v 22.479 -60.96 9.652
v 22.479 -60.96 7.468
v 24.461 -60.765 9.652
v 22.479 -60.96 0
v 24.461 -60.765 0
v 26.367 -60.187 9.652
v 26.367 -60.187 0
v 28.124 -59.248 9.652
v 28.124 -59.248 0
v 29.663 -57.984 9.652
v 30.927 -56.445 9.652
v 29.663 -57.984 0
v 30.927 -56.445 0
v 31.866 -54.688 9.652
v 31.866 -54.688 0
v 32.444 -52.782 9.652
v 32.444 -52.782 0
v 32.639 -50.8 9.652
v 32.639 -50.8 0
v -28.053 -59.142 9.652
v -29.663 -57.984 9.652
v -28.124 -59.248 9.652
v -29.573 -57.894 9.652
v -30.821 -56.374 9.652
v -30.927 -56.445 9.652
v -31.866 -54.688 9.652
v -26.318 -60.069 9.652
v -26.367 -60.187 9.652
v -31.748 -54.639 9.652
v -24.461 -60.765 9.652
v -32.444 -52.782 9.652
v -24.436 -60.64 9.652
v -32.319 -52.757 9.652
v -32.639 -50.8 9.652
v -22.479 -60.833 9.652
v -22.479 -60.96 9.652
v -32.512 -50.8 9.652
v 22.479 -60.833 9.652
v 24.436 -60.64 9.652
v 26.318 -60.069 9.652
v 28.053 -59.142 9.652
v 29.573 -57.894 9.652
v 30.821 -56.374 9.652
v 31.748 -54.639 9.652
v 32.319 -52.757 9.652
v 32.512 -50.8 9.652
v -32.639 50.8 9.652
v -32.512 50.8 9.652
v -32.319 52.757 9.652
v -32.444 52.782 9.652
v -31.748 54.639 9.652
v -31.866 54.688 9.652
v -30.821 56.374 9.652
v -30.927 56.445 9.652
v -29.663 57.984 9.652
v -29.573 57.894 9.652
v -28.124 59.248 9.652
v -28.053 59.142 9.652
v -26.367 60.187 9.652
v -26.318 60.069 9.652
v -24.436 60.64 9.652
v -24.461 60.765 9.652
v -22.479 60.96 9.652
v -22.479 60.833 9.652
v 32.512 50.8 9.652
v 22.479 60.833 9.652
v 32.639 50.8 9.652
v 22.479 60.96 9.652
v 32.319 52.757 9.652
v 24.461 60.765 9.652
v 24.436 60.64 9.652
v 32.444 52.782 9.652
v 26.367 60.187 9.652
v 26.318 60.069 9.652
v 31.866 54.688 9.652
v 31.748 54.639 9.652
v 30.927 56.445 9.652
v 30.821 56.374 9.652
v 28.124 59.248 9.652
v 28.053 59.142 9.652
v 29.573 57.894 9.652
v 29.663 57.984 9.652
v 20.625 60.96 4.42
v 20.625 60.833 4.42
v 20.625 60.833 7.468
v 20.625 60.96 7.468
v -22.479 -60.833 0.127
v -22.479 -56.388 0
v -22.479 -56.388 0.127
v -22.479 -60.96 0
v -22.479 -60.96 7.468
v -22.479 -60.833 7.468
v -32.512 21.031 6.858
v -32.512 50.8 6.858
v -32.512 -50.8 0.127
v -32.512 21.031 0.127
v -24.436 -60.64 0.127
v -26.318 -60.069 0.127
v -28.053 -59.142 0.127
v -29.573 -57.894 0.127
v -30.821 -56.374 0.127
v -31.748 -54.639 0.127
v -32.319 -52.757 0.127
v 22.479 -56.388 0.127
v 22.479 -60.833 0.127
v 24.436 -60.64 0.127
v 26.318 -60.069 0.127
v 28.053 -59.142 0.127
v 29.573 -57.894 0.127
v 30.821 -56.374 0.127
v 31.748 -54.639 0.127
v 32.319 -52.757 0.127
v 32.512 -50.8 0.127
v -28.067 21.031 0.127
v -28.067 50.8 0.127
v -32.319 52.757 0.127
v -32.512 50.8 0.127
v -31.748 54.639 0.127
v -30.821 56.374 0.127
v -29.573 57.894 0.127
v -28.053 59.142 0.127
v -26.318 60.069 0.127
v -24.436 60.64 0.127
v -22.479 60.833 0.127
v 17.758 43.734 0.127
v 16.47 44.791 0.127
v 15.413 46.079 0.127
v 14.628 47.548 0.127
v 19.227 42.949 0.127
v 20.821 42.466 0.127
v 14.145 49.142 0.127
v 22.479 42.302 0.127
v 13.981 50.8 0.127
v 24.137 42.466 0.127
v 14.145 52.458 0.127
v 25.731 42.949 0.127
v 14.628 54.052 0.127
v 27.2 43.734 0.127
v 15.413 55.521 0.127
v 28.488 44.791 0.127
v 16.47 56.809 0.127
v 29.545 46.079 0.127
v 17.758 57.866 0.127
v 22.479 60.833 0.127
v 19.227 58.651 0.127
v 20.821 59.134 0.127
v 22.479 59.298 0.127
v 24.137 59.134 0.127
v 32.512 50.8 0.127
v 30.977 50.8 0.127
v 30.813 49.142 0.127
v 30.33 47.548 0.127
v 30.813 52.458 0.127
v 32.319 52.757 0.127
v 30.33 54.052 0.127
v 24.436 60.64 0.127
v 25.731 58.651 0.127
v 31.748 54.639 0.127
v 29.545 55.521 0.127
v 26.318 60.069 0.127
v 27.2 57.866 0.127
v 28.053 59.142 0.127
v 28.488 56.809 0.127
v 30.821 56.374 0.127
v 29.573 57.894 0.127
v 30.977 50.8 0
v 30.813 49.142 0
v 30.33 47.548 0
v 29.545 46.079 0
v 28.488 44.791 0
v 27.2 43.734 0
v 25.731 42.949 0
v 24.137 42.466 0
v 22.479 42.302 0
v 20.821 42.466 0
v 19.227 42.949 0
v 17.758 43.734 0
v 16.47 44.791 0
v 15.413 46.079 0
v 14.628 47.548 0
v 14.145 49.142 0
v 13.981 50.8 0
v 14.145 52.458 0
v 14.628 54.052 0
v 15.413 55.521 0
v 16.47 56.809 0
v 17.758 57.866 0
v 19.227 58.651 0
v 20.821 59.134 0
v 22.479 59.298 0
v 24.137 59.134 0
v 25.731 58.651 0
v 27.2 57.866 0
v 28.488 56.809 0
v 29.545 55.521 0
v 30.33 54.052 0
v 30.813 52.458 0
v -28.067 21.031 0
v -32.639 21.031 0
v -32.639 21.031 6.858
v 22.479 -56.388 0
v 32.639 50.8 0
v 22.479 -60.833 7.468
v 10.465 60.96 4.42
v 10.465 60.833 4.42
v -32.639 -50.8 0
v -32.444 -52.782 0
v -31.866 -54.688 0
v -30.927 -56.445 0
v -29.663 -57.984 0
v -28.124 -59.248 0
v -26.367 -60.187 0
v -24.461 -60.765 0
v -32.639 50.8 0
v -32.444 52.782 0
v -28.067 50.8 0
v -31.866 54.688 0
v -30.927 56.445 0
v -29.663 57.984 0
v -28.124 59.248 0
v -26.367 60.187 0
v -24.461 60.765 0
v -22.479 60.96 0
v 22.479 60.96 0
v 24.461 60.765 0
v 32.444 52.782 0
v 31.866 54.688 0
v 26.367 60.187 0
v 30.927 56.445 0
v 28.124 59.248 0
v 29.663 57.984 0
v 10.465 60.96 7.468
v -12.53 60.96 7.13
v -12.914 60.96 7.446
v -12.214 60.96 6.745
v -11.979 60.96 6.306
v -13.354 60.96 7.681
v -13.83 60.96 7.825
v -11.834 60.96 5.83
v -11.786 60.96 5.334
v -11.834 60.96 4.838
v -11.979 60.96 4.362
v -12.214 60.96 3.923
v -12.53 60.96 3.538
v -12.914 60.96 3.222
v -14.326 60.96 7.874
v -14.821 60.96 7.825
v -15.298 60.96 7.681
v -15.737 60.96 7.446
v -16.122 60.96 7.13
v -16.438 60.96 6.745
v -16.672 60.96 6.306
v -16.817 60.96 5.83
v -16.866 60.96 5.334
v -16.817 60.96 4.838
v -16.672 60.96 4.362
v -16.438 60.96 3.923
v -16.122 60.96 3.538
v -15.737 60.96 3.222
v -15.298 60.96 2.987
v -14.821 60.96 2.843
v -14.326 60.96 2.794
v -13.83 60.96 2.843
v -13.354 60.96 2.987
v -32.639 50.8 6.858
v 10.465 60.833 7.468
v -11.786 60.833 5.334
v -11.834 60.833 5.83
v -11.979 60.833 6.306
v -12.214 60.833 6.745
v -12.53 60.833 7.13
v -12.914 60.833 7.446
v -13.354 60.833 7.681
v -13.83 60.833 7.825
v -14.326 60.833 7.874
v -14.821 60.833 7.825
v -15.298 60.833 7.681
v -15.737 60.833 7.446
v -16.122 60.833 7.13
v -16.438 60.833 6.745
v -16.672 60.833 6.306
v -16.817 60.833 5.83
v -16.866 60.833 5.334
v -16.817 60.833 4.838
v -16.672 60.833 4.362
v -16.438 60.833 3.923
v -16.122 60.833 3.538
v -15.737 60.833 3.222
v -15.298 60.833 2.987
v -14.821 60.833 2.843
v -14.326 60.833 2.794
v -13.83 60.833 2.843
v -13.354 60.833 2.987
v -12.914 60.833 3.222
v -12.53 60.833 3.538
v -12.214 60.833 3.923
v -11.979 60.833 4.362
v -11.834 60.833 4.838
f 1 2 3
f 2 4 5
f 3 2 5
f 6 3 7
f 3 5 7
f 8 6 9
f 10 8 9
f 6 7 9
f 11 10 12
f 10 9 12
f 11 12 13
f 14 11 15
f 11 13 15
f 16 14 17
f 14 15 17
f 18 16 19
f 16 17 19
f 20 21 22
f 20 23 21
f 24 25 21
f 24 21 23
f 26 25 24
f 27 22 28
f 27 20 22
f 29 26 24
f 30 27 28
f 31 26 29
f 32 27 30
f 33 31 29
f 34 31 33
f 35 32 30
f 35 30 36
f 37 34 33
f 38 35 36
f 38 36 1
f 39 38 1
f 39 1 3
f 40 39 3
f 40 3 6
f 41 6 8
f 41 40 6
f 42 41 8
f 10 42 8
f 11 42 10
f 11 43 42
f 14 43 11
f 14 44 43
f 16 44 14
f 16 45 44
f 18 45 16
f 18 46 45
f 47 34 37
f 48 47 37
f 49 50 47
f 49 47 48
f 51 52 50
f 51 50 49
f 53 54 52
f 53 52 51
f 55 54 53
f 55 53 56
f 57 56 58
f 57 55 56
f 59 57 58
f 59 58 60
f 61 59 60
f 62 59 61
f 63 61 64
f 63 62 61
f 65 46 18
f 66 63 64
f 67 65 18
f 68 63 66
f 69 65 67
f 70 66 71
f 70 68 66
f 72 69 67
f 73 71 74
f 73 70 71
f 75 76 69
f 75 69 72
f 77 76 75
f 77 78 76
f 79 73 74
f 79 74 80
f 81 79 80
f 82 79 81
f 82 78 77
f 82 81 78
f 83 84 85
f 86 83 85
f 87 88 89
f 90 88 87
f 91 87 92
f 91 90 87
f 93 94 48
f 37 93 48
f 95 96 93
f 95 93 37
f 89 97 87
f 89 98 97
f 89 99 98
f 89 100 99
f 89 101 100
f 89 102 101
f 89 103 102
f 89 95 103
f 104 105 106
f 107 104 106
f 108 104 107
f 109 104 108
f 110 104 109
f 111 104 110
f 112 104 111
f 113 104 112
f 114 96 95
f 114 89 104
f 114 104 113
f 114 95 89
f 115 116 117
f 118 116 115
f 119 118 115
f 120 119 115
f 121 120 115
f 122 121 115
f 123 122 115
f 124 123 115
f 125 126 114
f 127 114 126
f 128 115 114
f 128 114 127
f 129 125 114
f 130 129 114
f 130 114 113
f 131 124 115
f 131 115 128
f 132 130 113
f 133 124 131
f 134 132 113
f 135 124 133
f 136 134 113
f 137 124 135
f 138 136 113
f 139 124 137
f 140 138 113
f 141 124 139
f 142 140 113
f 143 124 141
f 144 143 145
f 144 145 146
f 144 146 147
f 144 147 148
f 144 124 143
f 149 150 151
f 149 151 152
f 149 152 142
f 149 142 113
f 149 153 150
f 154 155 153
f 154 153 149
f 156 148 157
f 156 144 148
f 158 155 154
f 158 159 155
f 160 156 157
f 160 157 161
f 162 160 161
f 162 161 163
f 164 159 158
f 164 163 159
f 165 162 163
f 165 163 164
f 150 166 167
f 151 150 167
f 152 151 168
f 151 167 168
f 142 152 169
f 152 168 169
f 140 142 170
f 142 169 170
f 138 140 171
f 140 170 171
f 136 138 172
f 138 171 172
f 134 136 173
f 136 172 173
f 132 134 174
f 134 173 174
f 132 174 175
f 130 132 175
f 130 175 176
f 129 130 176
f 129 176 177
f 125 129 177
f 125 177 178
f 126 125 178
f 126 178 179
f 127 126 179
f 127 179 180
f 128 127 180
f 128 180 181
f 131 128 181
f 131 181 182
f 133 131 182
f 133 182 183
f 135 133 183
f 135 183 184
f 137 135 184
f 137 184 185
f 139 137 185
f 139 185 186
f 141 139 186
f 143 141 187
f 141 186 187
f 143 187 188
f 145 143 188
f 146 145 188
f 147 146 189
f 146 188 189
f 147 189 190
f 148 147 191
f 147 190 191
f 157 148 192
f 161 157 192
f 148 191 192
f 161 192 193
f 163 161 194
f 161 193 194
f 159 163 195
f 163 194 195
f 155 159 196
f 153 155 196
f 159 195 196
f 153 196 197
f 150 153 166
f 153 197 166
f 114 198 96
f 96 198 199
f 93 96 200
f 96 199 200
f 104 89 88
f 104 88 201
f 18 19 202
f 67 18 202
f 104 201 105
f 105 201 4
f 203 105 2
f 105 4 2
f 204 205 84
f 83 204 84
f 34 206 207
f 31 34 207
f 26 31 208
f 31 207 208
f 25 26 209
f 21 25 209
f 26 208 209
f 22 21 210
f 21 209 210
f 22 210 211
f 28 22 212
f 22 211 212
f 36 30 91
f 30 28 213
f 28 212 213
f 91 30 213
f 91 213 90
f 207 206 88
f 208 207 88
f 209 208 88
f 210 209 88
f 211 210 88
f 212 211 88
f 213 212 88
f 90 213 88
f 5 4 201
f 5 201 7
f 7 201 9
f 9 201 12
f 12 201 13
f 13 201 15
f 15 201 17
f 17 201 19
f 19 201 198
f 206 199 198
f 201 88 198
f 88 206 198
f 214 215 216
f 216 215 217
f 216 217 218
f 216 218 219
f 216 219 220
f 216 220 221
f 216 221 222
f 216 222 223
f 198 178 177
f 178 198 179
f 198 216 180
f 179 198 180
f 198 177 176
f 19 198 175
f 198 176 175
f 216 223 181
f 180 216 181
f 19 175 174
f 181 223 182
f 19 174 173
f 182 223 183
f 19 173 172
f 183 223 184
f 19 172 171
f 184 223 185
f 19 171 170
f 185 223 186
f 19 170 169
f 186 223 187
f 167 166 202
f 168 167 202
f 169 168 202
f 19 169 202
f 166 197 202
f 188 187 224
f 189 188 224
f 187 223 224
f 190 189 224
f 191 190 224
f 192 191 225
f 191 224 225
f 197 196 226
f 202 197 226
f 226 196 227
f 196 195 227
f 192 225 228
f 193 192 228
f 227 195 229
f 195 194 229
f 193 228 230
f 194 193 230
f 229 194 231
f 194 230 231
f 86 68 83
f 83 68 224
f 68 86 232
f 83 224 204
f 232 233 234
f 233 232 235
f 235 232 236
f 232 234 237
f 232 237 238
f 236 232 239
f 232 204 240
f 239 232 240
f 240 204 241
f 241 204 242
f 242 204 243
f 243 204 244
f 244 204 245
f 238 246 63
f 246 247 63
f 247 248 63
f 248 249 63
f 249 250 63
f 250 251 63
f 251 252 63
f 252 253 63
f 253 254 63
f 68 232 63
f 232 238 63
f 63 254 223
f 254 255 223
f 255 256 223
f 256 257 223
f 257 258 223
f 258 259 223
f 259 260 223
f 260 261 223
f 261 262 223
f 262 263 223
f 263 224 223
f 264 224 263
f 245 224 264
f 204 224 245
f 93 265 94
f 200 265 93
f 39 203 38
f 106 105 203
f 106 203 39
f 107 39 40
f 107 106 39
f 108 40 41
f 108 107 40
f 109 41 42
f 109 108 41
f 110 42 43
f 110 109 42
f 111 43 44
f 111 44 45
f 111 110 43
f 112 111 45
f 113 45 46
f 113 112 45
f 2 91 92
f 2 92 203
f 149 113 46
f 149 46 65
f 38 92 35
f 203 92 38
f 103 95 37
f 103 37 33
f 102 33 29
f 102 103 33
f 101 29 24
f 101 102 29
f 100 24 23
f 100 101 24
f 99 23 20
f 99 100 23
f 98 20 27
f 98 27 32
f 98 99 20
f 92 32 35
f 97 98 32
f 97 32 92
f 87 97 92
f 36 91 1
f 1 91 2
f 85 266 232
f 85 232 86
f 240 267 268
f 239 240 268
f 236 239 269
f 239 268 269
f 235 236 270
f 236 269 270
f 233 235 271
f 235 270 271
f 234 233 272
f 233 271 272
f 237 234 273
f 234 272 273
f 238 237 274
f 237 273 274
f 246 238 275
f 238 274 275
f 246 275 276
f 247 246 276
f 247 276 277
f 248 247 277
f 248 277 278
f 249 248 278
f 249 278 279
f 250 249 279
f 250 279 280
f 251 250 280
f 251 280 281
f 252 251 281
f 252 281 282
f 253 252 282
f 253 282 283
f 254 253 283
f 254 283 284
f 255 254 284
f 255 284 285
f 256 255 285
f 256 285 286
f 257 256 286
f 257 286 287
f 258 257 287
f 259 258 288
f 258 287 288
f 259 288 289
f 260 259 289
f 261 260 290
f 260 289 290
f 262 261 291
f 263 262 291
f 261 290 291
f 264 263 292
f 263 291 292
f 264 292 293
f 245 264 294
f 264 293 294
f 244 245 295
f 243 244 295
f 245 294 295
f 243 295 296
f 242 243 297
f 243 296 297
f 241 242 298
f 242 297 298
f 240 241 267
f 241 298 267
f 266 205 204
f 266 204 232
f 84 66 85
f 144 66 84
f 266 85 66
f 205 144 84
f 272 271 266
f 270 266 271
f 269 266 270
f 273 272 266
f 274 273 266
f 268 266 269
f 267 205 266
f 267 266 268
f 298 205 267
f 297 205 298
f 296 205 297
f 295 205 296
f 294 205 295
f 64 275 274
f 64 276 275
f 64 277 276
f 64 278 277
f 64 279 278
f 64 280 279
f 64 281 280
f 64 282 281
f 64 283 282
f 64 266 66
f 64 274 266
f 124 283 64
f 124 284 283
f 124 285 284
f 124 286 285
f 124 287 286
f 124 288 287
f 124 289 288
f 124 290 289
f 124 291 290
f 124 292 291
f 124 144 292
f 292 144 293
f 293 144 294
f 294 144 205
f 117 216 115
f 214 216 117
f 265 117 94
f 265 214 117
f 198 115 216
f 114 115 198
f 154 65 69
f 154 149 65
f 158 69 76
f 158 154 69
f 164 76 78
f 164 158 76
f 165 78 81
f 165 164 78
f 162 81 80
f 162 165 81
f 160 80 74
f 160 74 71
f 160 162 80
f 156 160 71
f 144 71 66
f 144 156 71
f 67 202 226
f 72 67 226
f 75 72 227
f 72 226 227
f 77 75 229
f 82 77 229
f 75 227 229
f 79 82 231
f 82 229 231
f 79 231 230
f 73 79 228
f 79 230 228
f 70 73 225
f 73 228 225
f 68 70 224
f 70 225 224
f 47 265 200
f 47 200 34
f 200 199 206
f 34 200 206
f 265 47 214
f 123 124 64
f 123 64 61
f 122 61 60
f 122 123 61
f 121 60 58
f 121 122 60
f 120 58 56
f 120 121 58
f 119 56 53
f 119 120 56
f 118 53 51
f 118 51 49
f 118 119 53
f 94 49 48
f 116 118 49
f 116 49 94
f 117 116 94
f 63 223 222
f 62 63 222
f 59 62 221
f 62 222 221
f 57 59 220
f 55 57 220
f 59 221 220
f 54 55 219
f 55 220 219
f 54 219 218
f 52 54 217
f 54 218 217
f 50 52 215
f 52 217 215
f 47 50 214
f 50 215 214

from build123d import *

# Parameters (mm, degrees)
F1_DEPTH  = 9.652
F2_T      = -0.127
F3_W      = 10.16
F3_H      = 3.048
F3_R      = 2.54
F4_DEPTH  = 4.572
F5_W      = 29.768799
F5_H      = 6.858
F6_DEPTH  = 4.572
F7_W      = 44.958
F7_H      = 7.4676
F8_DEPTH  = 4.572
F9_R      = 8.497621
F10_DEPTH = 25.4


with BuildPart() as f1:
    # F0 (on Top) → F1 (new body)
    with BuildSketch(Plane.XY):
        with BuildLine():
            Line((22.479, 60.96), (-22.479, 60.96))
            ThreePointArc((-22.479, 60.96), (-29.663205, 57.984205), (-32.639, 50.8))
            Line((-32.639, 50.8), (-32.639, -50.8))
            ThreePointArc((-32.639, -50.8), (-29.663205, -57.984205), (-22.479, -60.96))
            Line((-22.479, -60.96), (22.479, -60.96))
            ThreePointArc((22.479, -60.96), (29.663205, -57.984205), (32.639, -50.8))
            Line((32.639, -50.8), (32.639, 50.8))
            ThreePointArc((32.639, 50.8), (29.663205, 57.984205), (22.479, 60.96))
        make_face()
    extrude(amount=F1_DEPTH)

    # F2
    f2_openings = [f1.faces().sort_by_distance(p)[0] for p in [
        (0, 0, 9.652),
    ]]
    offset(amount=F2_T, openings=f2_openings)

    # F3 (on face) → F4 (cut)
    with BuildSketch(Plane.XZ.offset(-60.833)):
        with Locations((15.544799, 5.9436)):
            Rectangle(F3_W, F3_H)
        with Locations((-14.3256, 5.334001)):
            Circle(F3_R)
    extrude(amount=-F4_DEPTH, mode=Mode.SUBTRACT)

    # F5 (on face) → F6 (cut)
    with BuildSketch(Plane(origin=(-32.639, 0, 0), x_dir=(0, -1, 0), z_dir=(-1, 0, 0))):
        with Locations((-35.9156, 3.429)):
            Rectangle(F5_W, F5_H)
    extrude(amount=-F6_DEPTH, mode=Mode.SUBTRACT)

    # F7 (on face) → F8 (cut)
    with BuildSketch(Plane.XZ.offset(60.96)):
        with Locations((0, 3.7338)):
            Rectangle(F7_W, F7_H)
    extrude(amount=-F8_DEPTH, mode=Mode.SUBTRACT)

    # F9 (on face) → F10 (cut)
    with BuildSketch(Plane(origin=(0, 0, 0), x_dir=(1, 0, 0), z_dir=(0, 0, -1))):
        with Locations((22.479, -50.8)):
            Circle(F9_R)
    extrude(amount=-F10_DEPTH, mode=Mode.SUBTRACT)


solid = f1.part
